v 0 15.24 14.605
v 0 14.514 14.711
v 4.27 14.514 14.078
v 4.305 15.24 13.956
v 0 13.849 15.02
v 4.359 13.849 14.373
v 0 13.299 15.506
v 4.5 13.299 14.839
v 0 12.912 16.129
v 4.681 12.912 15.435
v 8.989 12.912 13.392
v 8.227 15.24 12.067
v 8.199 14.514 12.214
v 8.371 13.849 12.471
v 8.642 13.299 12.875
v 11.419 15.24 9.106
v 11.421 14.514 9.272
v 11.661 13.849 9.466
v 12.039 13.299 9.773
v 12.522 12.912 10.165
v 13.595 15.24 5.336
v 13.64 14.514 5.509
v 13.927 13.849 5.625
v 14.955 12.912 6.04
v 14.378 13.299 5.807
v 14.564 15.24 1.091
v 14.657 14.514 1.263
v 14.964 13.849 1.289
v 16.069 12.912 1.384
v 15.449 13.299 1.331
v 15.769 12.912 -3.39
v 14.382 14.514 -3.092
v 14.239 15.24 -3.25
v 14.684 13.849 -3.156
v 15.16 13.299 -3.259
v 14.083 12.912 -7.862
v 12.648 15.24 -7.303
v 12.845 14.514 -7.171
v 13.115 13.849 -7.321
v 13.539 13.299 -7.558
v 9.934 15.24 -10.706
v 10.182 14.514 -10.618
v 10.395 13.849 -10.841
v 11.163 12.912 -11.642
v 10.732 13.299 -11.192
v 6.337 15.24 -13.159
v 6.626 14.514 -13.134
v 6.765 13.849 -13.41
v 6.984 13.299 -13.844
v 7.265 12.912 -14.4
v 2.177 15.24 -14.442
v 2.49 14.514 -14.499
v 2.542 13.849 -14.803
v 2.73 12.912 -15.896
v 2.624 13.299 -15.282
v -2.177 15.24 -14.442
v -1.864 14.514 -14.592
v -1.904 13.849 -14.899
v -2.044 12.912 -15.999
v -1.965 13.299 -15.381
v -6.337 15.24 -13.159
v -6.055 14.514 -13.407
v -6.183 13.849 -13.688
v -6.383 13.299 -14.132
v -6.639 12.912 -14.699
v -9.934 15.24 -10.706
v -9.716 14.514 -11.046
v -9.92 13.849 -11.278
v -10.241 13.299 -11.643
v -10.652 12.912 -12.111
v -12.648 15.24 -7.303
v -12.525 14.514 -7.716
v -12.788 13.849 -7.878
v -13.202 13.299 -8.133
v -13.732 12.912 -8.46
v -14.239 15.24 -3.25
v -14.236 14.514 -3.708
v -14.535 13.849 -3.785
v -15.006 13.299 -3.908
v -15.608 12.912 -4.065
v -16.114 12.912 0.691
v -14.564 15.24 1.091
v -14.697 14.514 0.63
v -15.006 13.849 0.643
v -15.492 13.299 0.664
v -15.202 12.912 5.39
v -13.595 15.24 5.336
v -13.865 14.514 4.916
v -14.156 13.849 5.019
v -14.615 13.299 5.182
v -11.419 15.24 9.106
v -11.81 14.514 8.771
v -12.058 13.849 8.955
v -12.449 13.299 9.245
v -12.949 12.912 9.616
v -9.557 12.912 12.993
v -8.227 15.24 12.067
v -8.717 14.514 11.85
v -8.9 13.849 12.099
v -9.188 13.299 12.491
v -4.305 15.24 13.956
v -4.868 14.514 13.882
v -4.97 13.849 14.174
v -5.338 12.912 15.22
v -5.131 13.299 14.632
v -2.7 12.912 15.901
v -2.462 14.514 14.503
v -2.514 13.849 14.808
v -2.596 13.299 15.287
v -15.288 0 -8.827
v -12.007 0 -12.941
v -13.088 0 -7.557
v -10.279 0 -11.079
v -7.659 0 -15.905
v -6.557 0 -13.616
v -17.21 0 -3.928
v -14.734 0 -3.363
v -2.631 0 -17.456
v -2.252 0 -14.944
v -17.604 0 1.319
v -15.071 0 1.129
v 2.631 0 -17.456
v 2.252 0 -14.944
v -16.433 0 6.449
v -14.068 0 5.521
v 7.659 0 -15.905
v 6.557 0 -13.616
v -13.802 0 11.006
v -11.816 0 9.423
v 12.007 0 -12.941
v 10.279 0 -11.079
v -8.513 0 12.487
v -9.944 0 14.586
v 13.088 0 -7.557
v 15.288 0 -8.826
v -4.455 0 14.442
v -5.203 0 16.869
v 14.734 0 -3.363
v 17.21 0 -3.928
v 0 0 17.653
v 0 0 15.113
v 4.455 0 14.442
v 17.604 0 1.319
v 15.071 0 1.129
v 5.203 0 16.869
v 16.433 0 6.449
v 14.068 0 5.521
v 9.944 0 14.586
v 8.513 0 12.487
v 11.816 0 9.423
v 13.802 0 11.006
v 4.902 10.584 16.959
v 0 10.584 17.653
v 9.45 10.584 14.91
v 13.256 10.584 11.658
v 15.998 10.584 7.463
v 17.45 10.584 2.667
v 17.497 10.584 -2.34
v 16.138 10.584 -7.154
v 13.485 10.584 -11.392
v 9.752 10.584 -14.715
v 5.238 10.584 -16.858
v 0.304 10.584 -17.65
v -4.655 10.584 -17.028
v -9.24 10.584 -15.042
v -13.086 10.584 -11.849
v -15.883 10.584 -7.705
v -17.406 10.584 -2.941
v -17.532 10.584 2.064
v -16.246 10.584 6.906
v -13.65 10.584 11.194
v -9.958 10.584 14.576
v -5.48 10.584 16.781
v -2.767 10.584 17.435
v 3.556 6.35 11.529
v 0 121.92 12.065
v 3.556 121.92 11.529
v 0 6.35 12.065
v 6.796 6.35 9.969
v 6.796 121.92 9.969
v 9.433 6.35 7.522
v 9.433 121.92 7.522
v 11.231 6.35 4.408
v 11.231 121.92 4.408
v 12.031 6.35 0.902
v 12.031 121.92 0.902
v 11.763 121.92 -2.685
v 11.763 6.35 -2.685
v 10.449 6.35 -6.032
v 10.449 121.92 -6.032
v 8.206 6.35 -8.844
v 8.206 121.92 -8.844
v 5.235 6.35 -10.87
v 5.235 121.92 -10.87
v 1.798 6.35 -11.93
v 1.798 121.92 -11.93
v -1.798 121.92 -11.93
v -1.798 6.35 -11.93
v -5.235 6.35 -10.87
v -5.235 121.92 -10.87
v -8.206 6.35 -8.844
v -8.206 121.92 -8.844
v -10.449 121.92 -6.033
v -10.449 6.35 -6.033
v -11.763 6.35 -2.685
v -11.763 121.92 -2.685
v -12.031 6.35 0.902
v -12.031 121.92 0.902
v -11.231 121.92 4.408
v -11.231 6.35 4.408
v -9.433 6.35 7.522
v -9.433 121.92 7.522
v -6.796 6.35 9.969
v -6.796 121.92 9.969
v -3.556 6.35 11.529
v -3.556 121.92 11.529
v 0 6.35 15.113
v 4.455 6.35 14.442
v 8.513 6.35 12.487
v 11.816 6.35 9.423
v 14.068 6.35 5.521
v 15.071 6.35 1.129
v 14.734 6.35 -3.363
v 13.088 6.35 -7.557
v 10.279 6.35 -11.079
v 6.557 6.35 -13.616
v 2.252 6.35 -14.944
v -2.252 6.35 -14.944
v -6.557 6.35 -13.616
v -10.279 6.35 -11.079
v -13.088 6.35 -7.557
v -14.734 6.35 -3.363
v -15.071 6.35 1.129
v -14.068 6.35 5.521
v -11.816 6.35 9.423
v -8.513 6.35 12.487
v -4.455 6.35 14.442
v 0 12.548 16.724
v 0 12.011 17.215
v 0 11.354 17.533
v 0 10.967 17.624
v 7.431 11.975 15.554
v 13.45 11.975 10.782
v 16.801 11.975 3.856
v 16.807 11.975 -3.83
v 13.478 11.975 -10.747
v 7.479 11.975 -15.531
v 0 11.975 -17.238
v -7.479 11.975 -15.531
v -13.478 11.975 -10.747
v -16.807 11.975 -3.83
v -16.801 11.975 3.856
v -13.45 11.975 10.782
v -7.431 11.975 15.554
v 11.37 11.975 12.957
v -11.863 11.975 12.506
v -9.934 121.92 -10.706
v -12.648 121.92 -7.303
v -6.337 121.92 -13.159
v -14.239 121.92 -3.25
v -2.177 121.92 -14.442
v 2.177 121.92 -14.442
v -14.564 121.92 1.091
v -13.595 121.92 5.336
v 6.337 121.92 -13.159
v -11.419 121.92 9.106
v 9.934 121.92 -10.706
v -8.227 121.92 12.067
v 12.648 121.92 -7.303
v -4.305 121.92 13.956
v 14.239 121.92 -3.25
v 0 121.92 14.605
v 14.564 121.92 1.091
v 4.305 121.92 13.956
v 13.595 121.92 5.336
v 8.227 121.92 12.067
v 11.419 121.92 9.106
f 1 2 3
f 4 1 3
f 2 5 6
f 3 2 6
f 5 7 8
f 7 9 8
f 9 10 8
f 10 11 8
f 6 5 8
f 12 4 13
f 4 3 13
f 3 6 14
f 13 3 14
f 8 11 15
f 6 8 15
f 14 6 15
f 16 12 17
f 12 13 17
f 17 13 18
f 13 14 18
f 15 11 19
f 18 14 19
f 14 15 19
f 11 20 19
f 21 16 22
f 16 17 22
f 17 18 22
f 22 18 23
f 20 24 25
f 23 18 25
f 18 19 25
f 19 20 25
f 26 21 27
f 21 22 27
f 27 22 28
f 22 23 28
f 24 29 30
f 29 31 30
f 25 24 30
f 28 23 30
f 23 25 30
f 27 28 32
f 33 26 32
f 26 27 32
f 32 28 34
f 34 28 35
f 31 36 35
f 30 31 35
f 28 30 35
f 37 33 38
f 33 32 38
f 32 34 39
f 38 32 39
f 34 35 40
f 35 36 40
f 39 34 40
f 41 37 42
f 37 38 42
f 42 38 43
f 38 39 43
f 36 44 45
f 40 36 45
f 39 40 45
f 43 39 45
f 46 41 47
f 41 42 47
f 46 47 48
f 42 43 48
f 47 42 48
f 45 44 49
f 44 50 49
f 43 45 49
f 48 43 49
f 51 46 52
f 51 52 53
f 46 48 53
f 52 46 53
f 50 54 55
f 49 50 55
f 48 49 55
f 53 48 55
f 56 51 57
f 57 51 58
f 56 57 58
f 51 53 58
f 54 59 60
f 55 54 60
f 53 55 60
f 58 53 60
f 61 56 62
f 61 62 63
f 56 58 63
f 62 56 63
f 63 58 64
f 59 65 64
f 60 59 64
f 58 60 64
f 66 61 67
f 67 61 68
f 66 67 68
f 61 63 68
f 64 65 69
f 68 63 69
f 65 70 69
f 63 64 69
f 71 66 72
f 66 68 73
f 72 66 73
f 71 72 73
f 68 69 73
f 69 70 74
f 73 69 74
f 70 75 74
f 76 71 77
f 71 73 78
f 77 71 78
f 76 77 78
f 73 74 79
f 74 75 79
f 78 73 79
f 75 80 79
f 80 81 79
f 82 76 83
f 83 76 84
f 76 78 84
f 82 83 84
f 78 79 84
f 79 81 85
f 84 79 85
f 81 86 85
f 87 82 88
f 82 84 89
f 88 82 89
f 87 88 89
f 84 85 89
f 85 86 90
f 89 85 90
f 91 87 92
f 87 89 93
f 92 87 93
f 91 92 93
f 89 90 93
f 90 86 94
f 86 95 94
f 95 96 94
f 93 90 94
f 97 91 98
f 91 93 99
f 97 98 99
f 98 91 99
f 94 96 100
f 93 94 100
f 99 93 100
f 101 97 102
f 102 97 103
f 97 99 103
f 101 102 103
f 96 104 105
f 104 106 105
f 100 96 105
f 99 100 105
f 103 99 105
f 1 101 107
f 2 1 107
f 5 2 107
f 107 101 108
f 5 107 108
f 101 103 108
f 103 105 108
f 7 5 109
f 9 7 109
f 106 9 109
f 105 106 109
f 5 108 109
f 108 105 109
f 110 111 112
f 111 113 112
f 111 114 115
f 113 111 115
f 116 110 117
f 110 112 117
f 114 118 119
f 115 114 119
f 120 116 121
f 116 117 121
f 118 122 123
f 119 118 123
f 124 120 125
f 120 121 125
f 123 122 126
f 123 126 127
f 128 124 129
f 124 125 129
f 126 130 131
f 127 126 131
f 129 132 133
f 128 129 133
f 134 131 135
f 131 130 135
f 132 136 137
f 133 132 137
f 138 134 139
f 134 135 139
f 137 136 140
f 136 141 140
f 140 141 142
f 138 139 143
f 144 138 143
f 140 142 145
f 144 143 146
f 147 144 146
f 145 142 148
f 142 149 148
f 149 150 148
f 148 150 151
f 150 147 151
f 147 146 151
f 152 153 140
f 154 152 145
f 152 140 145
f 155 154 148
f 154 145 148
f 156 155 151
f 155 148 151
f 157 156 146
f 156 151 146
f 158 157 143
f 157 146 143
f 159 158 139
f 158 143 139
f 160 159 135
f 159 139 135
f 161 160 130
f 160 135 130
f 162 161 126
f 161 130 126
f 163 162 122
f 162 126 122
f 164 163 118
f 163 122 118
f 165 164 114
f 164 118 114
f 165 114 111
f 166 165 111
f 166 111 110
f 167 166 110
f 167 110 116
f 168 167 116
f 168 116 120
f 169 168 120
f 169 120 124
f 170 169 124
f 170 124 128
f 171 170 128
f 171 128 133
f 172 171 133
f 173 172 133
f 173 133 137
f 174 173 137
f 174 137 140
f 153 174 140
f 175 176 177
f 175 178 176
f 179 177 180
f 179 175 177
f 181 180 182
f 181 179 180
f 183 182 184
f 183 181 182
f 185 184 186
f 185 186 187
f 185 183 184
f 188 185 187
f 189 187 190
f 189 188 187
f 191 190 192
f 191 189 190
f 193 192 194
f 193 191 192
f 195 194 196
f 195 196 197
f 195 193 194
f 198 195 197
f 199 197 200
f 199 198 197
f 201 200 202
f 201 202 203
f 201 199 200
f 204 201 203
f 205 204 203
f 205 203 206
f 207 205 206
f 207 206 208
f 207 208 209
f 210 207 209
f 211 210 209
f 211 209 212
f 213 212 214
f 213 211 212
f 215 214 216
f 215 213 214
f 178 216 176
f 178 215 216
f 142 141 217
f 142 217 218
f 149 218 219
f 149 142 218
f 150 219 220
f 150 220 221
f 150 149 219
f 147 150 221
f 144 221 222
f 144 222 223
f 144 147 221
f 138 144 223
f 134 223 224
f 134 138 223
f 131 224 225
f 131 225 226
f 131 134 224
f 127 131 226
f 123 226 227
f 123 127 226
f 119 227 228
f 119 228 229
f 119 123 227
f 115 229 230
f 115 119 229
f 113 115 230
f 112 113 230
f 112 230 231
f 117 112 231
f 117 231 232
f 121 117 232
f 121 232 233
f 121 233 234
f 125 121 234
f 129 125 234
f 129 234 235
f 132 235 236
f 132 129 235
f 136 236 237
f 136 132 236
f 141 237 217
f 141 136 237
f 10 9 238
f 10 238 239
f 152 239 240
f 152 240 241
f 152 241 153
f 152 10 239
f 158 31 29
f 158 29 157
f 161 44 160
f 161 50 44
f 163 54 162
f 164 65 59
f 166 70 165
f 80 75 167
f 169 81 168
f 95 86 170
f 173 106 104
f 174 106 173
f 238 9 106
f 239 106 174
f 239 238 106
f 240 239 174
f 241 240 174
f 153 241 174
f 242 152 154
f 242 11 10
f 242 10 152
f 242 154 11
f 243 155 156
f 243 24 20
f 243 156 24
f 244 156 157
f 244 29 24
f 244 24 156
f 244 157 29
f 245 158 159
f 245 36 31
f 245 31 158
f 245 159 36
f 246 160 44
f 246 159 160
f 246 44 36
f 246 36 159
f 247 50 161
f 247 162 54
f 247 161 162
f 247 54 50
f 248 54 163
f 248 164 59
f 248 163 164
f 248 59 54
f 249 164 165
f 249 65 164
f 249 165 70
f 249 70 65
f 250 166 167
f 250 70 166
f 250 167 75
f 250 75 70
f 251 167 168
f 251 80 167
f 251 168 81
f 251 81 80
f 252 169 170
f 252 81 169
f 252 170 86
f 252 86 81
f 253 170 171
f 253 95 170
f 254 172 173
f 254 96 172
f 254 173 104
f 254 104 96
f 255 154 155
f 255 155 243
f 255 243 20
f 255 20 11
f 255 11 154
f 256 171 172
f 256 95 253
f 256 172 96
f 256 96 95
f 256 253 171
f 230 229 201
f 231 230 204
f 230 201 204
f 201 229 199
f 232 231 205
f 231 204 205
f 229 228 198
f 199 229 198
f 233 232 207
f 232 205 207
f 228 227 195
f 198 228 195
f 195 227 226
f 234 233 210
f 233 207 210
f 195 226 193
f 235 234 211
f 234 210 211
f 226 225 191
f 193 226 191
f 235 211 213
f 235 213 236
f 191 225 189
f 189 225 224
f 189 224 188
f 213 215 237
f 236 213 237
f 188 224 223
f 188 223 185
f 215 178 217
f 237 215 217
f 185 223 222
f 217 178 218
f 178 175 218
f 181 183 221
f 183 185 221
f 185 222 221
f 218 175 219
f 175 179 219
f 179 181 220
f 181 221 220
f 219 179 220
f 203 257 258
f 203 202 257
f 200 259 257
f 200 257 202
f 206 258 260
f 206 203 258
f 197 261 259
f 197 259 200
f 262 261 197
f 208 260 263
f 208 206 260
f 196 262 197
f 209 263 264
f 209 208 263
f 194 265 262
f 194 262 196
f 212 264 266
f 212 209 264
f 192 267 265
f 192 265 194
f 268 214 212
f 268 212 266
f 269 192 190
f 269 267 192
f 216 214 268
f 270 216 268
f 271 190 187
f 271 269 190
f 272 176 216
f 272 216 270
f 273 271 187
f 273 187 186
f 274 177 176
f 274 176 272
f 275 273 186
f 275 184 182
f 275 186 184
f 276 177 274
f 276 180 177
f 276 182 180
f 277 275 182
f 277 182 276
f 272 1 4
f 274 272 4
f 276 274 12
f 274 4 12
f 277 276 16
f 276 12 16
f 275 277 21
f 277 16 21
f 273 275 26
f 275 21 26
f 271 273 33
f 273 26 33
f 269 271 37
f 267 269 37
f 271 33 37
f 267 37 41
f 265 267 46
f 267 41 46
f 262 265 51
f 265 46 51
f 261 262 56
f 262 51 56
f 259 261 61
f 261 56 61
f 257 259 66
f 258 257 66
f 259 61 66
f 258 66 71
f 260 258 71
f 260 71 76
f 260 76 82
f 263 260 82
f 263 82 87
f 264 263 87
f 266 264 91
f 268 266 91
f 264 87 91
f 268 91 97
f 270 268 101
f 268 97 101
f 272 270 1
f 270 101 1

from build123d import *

# Parameters (mm, degrees)
SKETCH1_R           = 17.653
SKETCH1_R_2         = 15.113
BOSS_EXTRUDE1_DEPTH = 6.35
SKETCH2_R           = 17.653
SKETCH2_R_2         = 12.065
BOSS_EXTRUDE2_DEPTH = 6.35
SKETCH3_R           = 14.605
SKETCH3_R_2         = 12.065
BOSS_EXTRUDE3_DEPTH = 109.22
FILLET1_R           = 2.54
FILLET2_R           = 2.54


with BuildPart() as part:
    # Sketch1 → Boss-Extrude1 (new body)
    with BuildSketch(Plane(origin=(0, 0, 0), x_dir=(1, 0, 0), z_dir=(0, 1, 0))):
        with Locations(Location((0, 0, 0), (0, 0, 270))):
            Circle(SKETCH1_R)
        with Locations(Location((0, 0, 0), (0, 0, 270))):
            Circle(SKETCH1_R_2, mode=Mode.SUBTRACT)
    extrude(amount=BOSS_EXTRUDE1_DEPTH)

    # Sketch2 → Boss-Extrude2 (add)
    with BuildSketch(Plane(origin=(0, 6.35, 0), x_dir=(1, 0, 0), z_dir=(0, 1, 0))):
        with Locations(Location((0, 0, 0), (0, 0, 270))):
            Circle(SKETCH2_R)
        with Locations(Location((0, 0, 0), (0, 0, 270))):
            Circle(SKETCH2_R_2, mode=Mode.SUBTRACT)
    extrude(amount=BOSS_EXTRUDE2_DEPTH)

    # Sketch3 → Boss-Extrude3 (add)
    with BuildSketch(Plane(origin=(0, 12.7, 0), x_dir=(1, 0, 0), z_dir=(0, 1, 0))):
        with Locations(Location((0, 0, 0), (0, 0, 270))):
            Circle(SKETCH3_R)
        with Locations(Location((0, 0, 0), (0, 0, 270))):
            Circle(SKETCH3_R_2, mode=Mode.SUBTRACT)
    extrude(amount=BOSS_EXTRUDE3_DEPTH)

    # Fillet1
    fillet1_edges = [part.edges().sort_by_distance(p)[0] for p in [
        (0, 12.7, -14.605),
    ]]
    fillet(fillet1_edges, radius=FILLET1_R)

    # Fillet2
    fillet2_edges = [part.edges().sort_by_distance(p)[0] for p in [
        (0, 12.7, -17.653),
    ]]
    fillet(fillet2_edges, radius=FILLET2_R)


solid = part.part
